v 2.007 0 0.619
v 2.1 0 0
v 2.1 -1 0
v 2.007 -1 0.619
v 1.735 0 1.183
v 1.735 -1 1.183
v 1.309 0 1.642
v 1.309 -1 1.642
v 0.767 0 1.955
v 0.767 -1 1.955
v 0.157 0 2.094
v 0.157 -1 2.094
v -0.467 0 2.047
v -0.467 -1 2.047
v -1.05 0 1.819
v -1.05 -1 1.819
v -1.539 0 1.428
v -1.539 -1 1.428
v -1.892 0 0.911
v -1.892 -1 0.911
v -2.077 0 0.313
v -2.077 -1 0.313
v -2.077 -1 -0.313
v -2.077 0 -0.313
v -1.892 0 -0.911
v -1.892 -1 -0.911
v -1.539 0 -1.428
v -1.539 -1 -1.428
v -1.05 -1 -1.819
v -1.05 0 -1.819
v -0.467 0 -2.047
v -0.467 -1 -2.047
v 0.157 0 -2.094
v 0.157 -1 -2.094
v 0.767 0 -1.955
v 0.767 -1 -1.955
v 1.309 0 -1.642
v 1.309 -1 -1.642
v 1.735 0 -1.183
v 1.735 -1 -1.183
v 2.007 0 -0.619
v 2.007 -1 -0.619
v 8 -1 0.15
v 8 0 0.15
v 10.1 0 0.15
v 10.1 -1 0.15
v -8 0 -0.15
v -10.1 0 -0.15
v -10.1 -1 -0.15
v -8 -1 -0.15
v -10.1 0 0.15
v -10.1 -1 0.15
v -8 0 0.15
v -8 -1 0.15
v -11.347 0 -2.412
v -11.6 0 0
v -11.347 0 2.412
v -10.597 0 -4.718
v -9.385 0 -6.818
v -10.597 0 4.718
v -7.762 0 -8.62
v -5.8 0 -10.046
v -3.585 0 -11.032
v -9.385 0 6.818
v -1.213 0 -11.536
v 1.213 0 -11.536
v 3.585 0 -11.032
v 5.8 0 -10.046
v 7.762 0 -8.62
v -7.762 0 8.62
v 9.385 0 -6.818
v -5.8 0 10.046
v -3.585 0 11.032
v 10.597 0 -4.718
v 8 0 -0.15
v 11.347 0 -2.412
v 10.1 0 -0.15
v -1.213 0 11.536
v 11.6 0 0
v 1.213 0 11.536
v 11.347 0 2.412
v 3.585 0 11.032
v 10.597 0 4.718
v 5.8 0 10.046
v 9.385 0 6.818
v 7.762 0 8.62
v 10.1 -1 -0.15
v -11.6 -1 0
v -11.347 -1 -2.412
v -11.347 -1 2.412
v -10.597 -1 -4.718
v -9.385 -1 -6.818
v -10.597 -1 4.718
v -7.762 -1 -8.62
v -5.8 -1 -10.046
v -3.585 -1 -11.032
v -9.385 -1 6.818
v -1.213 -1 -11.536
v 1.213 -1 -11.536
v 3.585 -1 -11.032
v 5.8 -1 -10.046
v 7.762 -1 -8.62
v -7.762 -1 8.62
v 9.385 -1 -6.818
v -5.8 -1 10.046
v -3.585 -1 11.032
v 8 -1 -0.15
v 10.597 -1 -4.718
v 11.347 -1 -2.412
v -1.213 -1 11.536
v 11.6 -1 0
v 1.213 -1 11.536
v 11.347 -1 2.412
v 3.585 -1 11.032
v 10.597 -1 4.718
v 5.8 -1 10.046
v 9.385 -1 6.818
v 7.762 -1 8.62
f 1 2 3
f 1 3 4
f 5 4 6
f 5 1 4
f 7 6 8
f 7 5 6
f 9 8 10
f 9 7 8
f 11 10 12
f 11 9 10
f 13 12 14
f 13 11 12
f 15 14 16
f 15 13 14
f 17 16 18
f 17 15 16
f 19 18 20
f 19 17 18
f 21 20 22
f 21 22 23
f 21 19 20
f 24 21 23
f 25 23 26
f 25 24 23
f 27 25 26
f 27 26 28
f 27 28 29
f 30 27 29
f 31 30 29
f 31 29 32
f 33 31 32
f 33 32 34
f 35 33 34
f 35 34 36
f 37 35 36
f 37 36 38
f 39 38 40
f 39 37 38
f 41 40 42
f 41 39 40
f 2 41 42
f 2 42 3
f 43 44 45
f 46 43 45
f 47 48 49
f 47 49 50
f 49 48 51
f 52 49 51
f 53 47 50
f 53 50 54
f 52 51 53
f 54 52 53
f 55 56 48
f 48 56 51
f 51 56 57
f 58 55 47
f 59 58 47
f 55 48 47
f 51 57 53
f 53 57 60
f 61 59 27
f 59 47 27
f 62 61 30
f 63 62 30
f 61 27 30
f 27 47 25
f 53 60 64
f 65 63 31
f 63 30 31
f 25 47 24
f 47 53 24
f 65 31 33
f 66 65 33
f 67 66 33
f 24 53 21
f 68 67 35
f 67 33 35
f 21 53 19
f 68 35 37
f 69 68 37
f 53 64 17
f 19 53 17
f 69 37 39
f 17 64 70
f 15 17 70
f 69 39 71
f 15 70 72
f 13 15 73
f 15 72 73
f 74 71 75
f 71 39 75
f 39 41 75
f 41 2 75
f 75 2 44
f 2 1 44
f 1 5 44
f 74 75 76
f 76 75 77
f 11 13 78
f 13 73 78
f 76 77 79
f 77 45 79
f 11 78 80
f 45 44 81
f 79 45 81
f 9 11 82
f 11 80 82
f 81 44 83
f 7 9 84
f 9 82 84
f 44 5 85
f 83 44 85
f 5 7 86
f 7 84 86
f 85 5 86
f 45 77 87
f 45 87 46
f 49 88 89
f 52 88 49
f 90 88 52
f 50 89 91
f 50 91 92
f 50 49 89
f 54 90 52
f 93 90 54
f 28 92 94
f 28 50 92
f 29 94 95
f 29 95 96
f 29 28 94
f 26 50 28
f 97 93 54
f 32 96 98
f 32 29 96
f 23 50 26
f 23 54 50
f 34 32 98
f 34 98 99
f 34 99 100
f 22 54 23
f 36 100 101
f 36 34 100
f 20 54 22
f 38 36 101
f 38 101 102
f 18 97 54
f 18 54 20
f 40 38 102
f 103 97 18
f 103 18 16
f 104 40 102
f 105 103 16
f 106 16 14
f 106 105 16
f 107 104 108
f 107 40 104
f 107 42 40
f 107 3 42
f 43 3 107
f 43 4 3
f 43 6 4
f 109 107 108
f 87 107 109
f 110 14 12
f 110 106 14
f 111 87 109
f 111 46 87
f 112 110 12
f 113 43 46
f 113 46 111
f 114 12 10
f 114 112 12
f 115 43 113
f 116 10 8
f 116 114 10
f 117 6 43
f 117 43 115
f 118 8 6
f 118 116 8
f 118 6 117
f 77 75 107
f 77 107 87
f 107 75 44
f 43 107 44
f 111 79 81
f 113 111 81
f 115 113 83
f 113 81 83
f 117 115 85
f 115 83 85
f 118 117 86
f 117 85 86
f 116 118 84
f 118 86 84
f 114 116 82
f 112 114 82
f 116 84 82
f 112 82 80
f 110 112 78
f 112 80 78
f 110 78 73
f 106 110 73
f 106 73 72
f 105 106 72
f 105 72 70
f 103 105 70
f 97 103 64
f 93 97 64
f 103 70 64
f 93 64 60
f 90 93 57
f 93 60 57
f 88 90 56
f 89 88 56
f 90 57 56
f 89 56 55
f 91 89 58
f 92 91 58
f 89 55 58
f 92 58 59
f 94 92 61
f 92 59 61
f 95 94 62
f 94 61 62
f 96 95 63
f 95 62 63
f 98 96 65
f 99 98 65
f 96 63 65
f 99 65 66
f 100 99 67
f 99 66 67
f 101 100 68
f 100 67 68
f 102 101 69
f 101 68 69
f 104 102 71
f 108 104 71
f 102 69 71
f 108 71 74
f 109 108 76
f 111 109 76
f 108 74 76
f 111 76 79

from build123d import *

# Parameters (mm, degrees)
F0_R     = 11.6
F0_W     = 2.1
F0_H     = 0.3
F0_R_2   = 2.1
F1_DEPTH = 1


with BuildPart() as f1:
    # F0 (on Front) → F1 (new body)
    with BuildSketch(Plane.XZ):
        Circle(F0_R)
        with Locations((-9.05, 0)):
            Rectangle(F0_W, F0_H, mode=Mode.SUBTRACT)
        Circle(F0_R_2, mode=Mode.SUBTRACT)
        with Locations((9.05, 0)):
            Rectangle(F0_W, F0_H, mode=Mode.SUBTRACT)
    extrude(amount=F1_DEPTH)


solid = f1.part
